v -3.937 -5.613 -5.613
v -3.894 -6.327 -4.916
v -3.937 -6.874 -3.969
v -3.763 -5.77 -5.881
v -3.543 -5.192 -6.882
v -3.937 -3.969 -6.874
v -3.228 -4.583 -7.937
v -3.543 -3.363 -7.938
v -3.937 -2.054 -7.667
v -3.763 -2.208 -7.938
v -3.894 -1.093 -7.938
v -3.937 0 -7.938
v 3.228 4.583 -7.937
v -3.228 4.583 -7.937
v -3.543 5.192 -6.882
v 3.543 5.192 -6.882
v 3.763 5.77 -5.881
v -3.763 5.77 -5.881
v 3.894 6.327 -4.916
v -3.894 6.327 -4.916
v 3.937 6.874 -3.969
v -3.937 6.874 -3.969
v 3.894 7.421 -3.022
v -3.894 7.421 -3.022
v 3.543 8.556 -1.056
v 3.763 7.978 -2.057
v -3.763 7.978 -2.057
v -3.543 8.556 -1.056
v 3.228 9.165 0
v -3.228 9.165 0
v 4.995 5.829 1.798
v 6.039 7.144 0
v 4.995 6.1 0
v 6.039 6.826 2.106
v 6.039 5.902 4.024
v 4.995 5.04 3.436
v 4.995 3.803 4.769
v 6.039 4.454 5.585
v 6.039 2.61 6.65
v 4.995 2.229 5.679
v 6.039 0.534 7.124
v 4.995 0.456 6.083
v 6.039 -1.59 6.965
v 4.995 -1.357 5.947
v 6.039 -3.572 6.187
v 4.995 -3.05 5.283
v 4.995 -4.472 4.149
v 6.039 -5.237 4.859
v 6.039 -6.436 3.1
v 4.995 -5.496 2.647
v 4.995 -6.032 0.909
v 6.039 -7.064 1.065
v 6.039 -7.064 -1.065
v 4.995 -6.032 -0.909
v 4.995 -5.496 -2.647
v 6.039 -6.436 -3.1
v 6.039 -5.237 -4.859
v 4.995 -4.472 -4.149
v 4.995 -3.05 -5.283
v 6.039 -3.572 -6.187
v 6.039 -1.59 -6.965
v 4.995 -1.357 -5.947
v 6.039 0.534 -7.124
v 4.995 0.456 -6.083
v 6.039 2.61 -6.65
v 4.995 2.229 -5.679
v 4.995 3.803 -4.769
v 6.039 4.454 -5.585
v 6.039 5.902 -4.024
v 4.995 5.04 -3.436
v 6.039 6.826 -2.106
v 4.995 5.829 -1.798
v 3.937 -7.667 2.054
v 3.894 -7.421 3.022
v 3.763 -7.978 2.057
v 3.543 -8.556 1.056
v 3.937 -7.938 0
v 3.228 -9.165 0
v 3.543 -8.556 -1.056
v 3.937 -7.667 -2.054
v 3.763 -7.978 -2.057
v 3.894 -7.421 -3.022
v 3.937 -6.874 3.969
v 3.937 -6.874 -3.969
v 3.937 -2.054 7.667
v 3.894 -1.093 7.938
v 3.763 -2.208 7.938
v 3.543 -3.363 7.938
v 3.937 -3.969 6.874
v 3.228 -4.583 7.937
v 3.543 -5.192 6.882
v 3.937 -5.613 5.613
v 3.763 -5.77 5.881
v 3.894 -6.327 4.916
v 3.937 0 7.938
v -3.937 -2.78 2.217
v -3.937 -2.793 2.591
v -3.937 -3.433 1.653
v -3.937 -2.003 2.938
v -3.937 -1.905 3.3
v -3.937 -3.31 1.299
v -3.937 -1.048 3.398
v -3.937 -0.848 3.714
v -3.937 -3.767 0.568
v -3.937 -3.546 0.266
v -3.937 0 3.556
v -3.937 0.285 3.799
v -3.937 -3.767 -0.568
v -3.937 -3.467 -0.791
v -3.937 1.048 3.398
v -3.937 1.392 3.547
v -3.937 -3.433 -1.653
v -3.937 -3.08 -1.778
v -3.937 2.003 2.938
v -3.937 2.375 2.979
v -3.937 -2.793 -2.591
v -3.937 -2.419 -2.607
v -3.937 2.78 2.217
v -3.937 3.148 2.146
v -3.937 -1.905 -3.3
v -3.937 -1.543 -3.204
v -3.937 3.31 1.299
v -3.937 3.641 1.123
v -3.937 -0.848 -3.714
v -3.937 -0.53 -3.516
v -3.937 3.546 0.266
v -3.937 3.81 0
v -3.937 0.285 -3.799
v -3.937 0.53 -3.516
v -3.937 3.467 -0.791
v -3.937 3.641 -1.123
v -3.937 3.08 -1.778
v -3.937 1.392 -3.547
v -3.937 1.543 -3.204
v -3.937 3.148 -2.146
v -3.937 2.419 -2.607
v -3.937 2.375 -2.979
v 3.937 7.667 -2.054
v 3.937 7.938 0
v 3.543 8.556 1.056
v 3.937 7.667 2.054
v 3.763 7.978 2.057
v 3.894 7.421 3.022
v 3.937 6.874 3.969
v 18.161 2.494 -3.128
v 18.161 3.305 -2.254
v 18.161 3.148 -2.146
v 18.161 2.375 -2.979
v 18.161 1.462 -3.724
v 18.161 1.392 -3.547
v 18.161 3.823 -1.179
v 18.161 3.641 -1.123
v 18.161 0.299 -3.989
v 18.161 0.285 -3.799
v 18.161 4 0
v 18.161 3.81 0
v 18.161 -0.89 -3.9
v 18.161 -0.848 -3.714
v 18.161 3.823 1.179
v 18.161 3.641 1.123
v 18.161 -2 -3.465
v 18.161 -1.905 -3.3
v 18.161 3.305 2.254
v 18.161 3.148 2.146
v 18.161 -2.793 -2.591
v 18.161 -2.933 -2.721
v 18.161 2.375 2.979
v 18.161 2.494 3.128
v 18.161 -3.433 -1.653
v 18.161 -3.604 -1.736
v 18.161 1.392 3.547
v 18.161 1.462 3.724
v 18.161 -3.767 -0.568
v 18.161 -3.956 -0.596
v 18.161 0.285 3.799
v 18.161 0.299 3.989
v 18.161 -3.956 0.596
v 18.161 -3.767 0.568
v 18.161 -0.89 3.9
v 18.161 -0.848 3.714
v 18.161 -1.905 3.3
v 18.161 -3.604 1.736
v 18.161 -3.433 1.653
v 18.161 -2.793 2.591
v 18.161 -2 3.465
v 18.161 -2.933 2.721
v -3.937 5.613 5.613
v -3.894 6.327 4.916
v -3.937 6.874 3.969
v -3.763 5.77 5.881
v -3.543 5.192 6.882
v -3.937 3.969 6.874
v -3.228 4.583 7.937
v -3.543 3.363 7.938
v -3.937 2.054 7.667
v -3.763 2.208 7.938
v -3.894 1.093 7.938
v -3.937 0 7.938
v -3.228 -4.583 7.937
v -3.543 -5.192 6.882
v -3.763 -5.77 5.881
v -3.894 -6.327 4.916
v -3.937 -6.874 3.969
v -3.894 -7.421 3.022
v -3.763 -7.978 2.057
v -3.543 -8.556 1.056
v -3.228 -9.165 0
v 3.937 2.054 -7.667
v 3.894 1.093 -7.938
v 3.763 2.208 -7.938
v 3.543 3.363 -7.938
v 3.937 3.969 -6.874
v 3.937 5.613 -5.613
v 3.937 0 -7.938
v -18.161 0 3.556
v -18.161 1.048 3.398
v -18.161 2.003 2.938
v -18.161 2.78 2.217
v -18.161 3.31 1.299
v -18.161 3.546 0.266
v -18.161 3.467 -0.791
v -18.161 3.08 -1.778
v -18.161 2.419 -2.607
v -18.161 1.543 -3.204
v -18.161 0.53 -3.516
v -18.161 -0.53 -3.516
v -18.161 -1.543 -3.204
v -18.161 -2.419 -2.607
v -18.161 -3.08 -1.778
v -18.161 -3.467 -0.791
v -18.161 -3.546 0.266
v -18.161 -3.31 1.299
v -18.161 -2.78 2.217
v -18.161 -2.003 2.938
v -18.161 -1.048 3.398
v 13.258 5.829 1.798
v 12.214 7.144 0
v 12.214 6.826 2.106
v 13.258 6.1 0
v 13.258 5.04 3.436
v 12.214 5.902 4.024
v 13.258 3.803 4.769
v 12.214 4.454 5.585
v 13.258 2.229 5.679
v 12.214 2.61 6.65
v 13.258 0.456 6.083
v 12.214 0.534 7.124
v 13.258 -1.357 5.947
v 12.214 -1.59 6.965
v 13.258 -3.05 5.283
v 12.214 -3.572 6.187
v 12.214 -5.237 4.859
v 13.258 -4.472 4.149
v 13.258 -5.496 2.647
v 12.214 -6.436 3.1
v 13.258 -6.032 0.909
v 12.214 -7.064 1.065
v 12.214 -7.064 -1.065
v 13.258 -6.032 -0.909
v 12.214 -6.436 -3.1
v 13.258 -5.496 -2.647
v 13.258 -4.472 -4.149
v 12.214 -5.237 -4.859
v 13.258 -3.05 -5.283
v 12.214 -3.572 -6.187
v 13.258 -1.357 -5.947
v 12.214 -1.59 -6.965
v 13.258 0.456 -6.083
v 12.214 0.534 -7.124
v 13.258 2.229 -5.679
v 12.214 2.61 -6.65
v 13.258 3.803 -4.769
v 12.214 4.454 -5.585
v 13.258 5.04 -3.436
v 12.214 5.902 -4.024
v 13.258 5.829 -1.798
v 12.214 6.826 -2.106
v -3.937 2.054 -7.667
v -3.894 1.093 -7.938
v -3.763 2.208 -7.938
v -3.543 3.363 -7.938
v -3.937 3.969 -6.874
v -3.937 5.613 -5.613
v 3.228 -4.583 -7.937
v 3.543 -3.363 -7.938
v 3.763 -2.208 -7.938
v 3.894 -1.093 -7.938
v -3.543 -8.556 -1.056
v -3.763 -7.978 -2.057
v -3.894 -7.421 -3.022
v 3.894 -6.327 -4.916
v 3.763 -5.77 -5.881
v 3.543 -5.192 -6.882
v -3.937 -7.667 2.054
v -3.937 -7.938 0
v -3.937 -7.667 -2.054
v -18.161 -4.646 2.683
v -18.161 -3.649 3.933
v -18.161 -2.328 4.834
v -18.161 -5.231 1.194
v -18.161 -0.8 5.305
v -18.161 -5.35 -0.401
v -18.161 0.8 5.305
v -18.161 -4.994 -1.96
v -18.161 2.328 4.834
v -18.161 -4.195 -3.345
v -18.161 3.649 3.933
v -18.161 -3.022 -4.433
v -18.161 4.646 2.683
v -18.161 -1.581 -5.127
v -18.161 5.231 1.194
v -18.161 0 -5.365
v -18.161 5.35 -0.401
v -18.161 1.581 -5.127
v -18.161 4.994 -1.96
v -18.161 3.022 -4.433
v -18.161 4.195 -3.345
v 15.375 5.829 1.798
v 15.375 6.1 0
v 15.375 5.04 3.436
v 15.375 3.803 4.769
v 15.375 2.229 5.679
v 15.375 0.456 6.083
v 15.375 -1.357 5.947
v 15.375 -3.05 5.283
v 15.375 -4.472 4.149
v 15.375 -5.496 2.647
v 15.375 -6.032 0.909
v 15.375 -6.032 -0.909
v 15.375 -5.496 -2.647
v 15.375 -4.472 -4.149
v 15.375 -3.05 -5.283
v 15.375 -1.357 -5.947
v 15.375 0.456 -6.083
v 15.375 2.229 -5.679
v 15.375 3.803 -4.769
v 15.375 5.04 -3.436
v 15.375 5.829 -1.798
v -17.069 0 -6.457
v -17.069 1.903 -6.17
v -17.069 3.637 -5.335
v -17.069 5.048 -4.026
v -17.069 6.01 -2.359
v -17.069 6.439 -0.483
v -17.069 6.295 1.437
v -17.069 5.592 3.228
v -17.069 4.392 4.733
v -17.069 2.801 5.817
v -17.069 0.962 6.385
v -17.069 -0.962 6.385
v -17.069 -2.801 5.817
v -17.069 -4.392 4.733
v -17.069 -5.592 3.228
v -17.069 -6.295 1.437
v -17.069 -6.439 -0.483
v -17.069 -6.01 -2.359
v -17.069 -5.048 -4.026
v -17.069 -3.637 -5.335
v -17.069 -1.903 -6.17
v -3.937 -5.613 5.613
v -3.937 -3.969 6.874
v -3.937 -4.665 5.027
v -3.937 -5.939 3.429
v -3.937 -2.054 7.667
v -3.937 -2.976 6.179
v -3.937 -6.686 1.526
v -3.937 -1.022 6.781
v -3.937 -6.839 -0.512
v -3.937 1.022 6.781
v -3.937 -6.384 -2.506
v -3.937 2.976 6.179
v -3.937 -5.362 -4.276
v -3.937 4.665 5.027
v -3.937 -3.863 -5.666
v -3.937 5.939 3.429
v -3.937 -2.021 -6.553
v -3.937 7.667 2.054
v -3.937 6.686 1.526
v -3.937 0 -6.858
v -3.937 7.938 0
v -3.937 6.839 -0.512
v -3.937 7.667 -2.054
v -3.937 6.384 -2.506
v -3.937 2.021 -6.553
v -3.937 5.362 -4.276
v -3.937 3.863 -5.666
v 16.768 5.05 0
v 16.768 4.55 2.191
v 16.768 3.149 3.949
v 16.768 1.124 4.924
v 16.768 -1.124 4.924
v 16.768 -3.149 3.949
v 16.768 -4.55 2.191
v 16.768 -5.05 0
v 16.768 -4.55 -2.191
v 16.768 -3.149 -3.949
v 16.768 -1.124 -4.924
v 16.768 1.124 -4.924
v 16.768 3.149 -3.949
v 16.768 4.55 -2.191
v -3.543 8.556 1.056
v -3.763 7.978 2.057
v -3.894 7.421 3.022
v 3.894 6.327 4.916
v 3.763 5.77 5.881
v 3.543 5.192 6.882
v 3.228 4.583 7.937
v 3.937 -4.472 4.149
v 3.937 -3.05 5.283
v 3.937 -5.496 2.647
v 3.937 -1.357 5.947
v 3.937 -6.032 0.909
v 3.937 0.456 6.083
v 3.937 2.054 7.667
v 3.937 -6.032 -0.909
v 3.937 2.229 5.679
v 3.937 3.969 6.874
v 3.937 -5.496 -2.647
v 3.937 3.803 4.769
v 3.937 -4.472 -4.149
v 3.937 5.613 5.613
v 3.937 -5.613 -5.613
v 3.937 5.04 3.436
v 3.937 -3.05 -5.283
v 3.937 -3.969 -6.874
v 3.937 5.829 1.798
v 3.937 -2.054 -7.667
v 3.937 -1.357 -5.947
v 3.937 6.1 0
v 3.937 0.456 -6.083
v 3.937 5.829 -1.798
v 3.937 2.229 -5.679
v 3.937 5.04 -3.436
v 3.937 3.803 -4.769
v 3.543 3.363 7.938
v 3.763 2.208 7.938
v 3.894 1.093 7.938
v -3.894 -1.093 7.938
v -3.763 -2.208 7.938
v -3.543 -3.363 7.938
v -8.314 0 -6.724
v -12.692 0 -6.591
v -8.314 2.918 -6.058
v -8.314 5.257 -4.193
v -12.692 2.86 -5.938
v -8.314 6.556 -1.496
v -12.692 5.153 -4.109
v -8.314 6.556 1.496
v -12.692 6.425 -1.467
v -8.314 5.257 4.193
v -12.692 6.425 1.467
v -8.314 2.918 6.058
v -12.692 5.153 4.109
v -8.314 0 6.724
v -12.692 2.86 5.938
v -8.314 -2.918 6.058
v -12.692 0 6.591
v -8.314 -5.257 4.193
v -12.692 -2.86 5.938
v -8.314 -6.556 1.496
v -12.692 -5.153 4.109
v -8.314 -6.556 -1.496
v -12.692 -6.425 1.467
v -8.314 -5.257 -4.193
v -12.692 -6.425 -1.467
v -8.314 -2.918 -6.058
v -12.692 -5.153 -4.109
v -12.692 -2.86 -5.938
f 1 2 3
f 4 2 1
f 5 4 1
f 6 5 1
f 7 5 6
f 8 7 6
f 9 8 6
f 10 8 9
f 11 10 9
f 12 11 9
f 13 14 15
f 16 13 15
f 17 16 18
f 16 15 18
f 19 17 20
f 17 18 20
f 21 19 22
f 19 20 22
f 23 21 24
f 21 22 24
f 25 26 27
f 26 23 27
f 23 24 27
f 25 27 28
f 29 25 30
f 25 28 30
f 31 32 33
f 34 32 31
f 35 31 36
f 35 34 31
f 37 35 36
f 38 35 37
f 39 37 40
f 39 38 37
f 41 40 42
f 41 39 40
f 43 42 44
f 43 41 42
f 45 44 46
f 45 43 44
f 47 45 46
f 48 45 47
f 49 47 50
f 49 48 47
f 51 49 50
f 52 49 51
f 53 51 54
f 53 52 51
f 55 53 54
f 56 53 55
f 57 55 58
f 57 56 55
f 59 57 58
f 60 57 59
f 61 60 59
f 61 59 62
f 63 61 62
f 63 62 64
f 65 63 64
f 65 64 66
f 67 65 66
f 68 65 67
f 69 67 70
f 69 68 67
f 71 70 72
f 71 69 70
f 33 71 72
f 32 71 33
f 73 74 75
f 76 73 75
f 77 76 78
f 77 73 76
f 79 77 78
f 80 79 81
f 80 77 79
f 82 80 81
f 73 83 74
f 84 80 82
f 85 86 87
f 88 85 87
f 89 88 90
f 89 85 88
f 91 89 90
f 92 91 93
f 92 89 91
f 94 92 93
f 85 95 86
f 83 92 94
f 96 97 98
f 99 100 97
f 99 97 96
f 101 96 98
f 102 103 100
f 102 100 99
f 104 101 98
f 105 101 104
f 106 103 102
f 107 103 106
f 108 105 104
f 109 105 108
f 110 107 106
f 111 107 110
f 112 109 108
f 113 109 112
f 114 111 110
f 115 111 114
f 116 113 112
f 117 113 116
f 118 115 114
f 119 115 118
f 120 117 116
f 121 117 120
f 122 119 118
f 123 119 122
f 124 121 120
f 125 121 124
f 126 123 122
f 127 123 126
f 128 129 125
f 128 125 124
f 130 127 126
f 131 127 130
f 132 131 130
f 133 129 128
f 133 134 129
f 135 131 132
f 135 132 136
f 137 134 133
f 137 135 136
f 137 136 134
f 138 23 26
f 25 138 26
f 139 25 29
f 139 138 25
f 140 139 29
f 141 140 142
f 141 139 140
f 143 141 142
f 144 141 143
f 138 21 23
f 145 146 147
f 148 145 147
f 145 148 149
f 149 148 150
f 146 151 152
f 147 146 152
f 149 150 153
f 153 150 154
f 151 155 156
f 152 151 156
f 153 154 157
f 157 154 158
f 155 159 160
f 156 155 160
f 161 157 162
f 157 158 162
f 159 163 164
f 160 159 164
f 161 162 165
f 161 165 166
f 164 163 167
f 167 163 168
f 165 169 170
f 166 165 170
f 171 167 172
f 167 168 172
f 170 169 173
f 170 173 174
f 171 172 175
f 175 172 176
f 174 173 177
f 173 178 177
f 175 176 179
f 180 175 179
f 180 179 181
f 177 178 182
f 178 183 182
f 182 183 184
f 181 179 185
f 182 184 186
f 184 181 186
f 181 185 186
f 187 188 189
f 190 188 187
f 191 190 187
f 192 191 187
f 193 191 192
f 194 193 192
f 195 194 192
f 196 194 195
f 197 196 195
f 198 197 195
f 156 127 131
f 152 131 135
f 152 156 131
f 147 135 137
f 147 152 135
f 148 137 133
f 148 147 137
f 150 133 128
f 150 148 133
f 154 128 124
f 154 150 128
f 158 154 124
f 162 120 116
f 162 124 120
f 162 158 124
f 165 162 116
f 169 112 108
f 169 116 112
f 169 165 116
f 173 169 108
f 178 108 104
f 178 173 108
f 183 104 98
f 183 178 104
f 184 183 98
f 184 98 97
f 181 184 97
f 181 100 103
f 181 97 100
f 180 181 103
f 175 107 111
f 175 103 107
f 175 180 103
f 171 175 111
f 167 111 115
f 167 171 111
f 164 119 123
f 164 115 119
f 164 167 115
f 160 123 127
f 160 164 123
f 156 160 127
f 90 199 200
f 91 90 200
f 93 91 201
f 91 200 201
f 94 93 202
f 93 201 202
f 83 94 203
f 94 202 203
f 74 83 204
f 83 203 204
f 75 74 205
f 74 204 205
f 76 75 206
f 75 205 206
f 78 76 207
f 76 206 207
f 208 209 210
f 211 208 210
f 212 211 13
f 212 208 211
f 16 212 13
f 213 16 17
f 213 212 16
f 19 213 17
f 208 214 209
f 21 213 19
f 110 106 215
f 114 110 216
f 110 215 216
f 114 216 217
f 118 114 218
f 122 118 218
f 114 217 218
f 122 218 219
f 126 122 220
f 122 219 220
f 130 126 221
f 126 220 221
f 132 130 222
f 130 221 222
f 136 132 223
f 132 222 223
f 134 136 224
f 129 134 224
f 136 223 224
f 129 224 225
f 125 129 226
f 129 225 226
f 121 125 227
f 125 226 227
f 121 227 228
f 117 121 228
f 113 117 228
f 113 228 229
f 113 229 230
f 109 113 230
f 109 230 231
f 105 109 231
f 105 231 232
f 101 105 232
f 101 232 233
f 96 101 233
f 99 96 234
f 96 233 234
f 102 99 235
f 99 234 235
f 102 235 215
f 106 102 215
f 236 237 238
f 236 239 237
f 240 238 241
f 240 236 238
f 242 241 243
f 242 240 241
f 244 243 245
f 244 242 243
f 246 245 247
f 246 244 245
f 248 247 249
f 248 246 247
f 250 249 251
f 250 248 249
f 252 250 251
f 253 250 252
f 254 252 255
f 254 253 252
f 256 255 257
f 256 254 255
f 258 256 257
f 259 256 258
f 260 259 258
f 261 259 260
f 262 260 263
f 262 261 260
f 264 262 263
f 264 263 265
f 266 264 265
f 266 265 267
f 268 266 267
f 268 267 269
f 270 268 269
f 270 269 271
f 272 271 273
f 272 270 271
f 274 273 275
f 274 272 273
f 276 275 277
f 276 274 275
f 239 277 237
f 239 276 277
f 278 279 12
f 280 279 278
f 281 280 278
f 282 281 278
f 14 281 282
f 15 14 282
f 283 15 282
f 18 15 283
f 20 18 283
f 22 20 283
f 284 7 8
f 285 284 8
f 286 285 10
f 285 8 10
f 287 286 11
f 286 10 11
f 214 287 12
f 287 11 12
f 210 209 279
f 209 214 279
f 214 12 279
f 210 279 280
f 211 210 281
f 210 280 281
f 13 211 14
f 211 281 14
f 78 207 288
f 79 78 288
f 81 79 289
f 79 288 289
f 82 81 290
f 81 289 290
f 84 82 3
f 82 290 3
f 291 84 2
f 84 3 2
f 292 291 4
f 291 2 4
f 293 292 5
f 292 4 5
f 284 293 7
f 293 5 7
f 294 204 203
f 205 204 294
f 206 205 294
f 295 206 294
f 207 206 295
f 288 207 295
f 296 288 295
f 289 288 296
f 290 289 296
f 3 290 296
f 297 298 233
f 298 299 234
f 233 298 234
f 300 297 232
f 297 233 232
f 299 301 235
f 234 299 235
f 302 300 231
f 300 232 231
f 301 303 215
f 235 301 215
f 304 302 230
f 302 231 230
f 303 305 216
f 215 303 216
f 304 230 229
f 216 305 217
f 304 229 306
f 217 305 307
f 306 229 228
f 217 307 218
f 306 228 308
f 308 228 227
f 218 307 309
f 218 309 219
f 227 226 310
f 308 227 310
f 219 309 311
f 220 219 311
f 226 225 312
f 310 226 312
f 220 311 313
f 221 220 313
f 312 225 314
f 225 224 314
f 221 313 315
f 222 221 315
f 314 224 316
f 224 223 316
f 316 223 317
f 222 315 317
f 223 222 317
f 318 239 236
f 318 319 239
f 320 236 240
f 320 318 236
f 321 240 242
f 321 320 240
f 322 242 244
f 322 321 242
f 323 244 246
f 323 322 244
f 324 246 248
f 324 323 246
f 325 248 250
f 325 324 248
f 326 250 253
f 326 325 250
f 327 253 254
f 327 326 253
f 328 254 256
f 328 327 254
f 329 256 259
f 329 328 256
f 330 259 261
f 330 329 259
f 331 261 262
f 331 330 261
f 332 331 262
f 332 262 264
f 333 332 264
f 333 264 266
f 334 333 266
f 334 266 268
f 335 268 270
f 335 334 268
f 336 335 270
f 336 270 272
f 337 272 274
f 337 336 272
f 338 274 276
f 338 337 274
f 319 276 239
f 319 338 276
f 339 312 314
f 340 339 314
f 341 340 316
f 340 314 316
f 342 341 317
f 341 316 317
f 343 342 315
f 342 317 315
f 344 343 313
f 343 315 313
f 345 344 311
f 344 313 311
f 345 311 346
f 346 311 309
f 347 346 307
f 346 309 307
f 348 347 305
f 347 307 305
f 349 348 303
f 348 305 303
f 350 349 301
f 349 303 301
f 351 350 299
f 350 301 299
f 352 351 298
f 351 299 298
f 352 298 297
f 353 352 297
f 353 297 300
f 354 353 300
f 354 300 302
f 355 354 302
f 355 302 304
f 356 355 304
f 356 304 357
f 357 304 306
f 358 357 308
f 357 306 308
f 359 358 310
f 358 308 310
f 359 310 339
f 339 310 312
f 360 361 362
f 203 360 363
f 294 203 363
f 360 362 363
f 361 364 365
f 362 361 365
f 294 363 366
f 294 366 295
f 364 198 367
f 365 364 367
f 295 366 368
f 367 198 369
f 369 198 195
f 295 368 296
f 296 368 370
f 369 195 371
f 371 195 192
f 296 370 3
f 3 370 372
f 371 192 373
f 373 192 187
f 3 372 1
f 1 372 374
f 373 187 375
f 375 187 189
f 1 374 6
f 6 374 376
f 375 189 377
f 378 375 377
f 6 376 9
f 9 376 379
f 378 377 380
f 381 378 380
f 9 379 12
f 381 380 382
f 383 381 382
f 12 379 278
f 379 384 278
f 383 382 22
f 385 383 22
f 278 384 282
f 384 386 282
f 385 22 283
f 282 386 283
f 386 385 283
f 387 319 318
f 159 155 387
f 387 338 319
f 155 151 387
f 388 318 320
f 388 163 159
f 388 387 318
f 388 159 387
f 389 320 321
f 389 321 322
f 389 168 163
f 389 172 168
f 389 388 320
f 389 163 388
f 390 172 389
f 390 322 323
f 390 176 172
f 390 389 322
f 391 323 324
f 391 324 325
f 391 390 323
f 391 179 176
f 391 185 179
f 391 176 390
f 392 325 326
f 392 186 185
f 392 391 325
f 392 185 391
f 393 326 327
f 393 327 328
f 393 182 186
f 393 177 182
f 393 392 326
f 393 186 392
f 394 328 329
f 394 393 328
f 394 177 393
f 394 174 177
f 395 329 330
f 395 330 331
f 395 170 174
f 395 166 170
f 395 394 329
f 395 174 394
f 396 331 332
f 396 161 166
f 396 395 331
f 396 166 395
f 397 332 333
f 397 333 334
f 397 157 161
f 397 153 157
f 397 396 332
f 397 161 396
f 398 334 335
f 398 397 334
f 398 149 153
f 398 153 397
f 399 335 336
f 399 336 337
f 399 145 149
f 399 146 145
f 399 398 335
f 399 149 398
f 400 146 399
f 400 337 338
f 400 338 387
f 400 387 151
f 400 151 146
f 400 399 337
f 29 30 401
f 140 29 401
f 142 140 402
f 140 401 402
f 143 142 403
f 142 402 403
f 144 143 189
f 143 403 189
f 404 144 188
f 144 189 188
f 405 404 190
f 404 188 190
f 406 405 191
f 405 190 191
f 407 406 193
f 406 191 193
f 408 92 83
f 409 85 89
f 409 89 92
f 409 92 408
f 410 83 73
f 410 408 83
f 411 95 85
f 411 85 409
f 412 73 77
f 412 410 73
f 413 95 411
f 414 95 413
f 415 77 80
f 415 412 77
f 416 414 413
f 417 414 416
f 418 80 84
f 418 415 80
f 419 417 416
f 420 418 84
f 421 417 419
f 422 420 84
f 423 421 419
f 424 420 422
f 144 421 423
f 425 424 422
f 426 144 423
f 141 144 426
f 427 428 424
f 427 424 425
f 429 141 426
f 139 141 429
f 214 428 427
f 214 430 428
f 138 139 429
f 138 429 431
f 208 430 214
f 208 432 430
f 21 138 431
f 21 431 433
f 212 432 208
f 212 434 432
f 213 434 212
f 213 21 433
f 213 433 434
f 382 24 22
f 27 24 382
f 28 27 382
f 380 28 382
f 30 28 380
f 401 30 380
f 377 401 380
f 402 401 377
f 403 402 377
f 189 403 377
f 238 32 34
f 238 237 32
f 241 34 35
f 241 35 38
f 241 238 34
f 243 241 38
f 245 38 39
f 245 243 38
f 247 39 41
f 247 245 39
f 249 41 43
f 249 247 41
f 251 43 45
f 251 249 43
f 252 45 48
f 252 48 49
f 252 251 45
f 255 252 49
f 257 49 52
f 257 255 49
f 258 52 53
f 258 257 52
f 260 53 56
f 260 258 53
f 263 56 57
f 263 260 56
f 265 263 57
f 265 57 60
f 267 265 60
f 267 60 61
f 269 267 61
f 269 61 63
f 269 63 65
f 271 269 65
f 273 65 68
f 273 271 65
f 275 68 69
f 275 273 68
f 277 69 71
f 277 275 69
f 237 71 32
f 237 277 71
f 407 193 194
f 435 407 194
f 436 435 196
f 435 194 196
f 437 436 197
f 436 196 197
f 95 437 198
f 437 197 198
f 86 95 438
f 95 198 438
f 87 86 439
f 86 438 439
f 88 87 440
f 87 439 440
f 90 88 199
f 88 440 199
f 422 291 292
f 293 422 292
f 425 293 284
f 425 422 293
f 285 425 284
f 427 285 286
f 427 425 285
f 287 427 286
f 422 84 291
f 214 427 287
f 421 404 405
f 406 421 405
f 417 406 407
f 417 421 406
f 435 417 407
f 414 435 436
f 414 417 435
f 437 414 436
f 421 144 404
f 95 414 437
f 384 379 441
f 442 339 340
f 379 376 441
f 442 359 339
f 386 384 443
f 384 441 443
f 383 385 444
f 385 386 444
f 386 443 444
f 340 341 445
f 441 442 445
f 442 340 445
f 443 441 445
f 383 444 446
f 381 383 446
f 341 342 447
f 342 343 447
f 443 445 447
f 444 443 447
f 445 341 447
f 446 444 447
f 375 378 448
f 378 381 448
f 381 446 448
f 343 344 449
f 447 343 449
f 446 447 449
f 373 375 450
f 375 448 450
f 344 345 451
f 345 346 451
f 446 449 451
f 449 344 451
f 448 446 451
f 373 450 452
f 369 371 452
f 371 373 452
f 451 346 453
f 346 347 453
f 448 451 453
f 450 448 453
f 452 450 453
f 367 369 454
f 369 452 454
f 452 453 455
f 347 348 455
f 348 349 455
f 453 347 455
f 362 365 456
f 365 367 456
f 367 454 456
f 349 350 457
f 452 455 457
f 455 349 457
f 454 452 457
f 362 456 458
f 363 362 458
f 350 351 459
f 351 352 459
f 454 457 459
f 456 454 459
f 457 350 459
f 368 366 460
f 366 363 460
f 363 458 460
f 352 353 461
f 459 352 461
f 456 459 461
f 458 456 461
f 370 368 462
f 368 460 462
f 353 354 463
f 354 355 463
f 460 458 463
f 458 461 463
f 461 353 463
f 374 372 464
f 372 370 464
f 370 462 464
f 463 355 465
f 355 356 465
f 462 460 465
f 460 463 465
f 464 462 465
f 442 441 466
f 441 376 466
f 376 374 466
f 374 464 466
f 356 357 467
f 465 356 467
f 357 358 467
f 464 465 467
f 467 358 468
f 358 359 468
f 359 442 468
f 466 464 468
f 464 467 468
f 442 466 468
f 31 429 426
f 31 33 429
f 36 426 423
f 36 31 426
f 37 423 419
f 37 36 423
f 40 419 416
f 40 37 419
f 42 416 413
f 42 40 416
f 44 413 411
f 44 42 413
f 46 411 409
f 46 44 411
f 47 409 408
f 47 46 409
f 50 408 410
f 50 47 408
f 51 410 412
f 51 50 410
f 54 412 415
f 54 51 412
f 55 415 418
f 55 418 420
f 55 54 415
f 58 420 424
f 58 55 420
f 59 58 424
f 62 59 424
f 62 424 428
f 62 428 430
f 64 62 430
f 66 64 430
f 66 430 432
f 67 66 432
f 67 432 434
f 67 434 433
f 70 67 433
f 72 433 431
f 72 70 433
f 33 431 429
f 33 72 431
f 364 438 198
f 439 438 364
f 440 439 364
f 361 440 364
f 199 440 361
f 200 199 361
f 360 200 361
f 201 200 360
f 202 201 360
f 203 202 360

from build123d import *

# Parameters (mm, degrees)
SKETCH6_W           = 36.322
SKETCH6_H           = 7.14375
EXTRUDE1_DEPTH      = 7.874
SKETCH7_W           = 36.322
SKETCH7_H           = 3.81
SKETCH17_R          = 7.14375
CUT_EXTRUDE1_DEPTH  = 14.224
SKETCH19_R          = 6.858
BOSS_EXTRUDE1_DEPTH = 14.224
BOSS_EXTRUDE1_TAPER = 1.75
CHAMFER1_SIZE2      = 1.058333333
CHAMFER1_SIZE       = 1.092196811
SKETCH22_R          = 6.858
BOSS_EXTRUDE3_DEPTH = 14.224
BOSS_EXTRUDE3_TAPER = 15
SKETCH23_R          = 3.556
CUT_EXTRUDE2_DEPTH  = 14.224


with BuildPart() as part:
    # Sketch6 → Revolve3 (revolve)
    with BuildSketch(Plane.XY):
        with Locations((0, 3.571875)):
            Rectangle(SKETCH6_W, SKETCH6_H)
    revolve(axis=Axis((-18.161, 0, 0), (1, 0, 0)))

    # Sketch12 → Extrude1 (add)
    with BuildSketch(Plane(origin=(-3.937, 0, 0), x_dir=(0, 0, -1), z_dir=(1, 0, 0))):
        Polygon((0, 9.165435523), (-7.9375, 4.582717762), (-7.9375, -4.582717762), (0, -9.165435523), (7.9375, -4.582717762), (7.9375, 4.582717762), align=None)
    extrude(amount=EXTRUDE1_DEPTH)

    # Sketch10 → Cut-Revolve6 (revolve, cut)
    with BuildSketch(Plane.XY):
        Polygon((6.038876886, 7.14375), (3.937, 7.14375), (3.937, 6.100206448), (4.995333333, 6.100206448), align=None)
        Polygon((18.161, 7.14375), (12.214385213, 7.14375), (13.257928765, 6.100206448), (15.374595432, 6.100206448), (18.161, 4.0005), align=None)
    revolve(axis=Axis((-18.161, 0, 0), (1, 0, 0)), mode=Mode.SUBTRACT)

    # Sketch7 → Cut-Revolve5 (revolve, cut)
    with BuildSketch(Plane.XY):
        with Locations((0, 1.905)):
            Rectangle(SKETCH7_W, SKETCH7_H)
    revolve(axis=Axis((18.161, 0, 0), (-1, 0, 0)), mode=Mode.SUBTRACT)

    # Sketch13 → Cut-Revolve7 (revolve, cut)
    with BuildSketch(Plane.XY):
        Polygon((-3.937, 9.165435523), (-3.937, 7.9375), (-3.228051095, 9.165435523), align=None)
        Polygon((3.228051095, 9.165435523), (3.937, 7.9375), (3.937, 9.165435523), align=None)
    revolve(axis=Axis((-18.161, 0, 0), (1, 0, 0)), mode=Mode.SUBTRACT)

    # Sketch17 → Cut-Extrude1 (cut)
    with BuildSketch(Plane.ZY.offset(18.161)):
        Circle(SKETCH17_R)
    extrude(amount=-CUT_EXTRUDE1_DEPTH, mode=Mode.SUBTRACT)


with BuildPart() as body_2:
    # Sketch19 → Boss-Extrude1 (new body)
    with BuildSketch(Plane(origin=(-3.937, 0, 0), x_dir=(0, 0, -1), z_dir=(1, 0, 0))):
        Circle(SKETCH19_R)
    extrude(amount=-BOSS_EXTRUDE1_DEPTH, taper=BOSS_EXTRUDE1_TAPER)

    # Chamfer1
    chamfer1_edges = [body_2.edges().sort_by_distance(p)[0] for p in [
        (-18.161, 0, 6.423417495),
    ]]
    chamfer(chamfer1_edges, length=CHAMFER1_SIZE, length2=CHAMFER1_SIZE2)

    # Sketch22 → Boss-Extrude3 (add)
    with BuildSketch(Plane(origin=(-3.937, 0, 0), x_dir=(0, 0, -1), z_dir=(1, 0, 0))):
        Circle(SKETCH22_R)
    extrude(amount=-BOSS_EXTRUDE3_DEPTH, taper=BOSS_EXTRUDE3_TAPER)

    # Combine1: union part
    add(part.part)

    # Sketch23 → Cut-Extrude2 (cut)
    with BuildSketch(Plane.ZY.offset(18.161)):
        Circle(SKETCH23_R)
    extrude(amount=-CUT_EXTRUDE2_DEPTH, mode=Mode.SUBTRACT)


solid = body_2.part
